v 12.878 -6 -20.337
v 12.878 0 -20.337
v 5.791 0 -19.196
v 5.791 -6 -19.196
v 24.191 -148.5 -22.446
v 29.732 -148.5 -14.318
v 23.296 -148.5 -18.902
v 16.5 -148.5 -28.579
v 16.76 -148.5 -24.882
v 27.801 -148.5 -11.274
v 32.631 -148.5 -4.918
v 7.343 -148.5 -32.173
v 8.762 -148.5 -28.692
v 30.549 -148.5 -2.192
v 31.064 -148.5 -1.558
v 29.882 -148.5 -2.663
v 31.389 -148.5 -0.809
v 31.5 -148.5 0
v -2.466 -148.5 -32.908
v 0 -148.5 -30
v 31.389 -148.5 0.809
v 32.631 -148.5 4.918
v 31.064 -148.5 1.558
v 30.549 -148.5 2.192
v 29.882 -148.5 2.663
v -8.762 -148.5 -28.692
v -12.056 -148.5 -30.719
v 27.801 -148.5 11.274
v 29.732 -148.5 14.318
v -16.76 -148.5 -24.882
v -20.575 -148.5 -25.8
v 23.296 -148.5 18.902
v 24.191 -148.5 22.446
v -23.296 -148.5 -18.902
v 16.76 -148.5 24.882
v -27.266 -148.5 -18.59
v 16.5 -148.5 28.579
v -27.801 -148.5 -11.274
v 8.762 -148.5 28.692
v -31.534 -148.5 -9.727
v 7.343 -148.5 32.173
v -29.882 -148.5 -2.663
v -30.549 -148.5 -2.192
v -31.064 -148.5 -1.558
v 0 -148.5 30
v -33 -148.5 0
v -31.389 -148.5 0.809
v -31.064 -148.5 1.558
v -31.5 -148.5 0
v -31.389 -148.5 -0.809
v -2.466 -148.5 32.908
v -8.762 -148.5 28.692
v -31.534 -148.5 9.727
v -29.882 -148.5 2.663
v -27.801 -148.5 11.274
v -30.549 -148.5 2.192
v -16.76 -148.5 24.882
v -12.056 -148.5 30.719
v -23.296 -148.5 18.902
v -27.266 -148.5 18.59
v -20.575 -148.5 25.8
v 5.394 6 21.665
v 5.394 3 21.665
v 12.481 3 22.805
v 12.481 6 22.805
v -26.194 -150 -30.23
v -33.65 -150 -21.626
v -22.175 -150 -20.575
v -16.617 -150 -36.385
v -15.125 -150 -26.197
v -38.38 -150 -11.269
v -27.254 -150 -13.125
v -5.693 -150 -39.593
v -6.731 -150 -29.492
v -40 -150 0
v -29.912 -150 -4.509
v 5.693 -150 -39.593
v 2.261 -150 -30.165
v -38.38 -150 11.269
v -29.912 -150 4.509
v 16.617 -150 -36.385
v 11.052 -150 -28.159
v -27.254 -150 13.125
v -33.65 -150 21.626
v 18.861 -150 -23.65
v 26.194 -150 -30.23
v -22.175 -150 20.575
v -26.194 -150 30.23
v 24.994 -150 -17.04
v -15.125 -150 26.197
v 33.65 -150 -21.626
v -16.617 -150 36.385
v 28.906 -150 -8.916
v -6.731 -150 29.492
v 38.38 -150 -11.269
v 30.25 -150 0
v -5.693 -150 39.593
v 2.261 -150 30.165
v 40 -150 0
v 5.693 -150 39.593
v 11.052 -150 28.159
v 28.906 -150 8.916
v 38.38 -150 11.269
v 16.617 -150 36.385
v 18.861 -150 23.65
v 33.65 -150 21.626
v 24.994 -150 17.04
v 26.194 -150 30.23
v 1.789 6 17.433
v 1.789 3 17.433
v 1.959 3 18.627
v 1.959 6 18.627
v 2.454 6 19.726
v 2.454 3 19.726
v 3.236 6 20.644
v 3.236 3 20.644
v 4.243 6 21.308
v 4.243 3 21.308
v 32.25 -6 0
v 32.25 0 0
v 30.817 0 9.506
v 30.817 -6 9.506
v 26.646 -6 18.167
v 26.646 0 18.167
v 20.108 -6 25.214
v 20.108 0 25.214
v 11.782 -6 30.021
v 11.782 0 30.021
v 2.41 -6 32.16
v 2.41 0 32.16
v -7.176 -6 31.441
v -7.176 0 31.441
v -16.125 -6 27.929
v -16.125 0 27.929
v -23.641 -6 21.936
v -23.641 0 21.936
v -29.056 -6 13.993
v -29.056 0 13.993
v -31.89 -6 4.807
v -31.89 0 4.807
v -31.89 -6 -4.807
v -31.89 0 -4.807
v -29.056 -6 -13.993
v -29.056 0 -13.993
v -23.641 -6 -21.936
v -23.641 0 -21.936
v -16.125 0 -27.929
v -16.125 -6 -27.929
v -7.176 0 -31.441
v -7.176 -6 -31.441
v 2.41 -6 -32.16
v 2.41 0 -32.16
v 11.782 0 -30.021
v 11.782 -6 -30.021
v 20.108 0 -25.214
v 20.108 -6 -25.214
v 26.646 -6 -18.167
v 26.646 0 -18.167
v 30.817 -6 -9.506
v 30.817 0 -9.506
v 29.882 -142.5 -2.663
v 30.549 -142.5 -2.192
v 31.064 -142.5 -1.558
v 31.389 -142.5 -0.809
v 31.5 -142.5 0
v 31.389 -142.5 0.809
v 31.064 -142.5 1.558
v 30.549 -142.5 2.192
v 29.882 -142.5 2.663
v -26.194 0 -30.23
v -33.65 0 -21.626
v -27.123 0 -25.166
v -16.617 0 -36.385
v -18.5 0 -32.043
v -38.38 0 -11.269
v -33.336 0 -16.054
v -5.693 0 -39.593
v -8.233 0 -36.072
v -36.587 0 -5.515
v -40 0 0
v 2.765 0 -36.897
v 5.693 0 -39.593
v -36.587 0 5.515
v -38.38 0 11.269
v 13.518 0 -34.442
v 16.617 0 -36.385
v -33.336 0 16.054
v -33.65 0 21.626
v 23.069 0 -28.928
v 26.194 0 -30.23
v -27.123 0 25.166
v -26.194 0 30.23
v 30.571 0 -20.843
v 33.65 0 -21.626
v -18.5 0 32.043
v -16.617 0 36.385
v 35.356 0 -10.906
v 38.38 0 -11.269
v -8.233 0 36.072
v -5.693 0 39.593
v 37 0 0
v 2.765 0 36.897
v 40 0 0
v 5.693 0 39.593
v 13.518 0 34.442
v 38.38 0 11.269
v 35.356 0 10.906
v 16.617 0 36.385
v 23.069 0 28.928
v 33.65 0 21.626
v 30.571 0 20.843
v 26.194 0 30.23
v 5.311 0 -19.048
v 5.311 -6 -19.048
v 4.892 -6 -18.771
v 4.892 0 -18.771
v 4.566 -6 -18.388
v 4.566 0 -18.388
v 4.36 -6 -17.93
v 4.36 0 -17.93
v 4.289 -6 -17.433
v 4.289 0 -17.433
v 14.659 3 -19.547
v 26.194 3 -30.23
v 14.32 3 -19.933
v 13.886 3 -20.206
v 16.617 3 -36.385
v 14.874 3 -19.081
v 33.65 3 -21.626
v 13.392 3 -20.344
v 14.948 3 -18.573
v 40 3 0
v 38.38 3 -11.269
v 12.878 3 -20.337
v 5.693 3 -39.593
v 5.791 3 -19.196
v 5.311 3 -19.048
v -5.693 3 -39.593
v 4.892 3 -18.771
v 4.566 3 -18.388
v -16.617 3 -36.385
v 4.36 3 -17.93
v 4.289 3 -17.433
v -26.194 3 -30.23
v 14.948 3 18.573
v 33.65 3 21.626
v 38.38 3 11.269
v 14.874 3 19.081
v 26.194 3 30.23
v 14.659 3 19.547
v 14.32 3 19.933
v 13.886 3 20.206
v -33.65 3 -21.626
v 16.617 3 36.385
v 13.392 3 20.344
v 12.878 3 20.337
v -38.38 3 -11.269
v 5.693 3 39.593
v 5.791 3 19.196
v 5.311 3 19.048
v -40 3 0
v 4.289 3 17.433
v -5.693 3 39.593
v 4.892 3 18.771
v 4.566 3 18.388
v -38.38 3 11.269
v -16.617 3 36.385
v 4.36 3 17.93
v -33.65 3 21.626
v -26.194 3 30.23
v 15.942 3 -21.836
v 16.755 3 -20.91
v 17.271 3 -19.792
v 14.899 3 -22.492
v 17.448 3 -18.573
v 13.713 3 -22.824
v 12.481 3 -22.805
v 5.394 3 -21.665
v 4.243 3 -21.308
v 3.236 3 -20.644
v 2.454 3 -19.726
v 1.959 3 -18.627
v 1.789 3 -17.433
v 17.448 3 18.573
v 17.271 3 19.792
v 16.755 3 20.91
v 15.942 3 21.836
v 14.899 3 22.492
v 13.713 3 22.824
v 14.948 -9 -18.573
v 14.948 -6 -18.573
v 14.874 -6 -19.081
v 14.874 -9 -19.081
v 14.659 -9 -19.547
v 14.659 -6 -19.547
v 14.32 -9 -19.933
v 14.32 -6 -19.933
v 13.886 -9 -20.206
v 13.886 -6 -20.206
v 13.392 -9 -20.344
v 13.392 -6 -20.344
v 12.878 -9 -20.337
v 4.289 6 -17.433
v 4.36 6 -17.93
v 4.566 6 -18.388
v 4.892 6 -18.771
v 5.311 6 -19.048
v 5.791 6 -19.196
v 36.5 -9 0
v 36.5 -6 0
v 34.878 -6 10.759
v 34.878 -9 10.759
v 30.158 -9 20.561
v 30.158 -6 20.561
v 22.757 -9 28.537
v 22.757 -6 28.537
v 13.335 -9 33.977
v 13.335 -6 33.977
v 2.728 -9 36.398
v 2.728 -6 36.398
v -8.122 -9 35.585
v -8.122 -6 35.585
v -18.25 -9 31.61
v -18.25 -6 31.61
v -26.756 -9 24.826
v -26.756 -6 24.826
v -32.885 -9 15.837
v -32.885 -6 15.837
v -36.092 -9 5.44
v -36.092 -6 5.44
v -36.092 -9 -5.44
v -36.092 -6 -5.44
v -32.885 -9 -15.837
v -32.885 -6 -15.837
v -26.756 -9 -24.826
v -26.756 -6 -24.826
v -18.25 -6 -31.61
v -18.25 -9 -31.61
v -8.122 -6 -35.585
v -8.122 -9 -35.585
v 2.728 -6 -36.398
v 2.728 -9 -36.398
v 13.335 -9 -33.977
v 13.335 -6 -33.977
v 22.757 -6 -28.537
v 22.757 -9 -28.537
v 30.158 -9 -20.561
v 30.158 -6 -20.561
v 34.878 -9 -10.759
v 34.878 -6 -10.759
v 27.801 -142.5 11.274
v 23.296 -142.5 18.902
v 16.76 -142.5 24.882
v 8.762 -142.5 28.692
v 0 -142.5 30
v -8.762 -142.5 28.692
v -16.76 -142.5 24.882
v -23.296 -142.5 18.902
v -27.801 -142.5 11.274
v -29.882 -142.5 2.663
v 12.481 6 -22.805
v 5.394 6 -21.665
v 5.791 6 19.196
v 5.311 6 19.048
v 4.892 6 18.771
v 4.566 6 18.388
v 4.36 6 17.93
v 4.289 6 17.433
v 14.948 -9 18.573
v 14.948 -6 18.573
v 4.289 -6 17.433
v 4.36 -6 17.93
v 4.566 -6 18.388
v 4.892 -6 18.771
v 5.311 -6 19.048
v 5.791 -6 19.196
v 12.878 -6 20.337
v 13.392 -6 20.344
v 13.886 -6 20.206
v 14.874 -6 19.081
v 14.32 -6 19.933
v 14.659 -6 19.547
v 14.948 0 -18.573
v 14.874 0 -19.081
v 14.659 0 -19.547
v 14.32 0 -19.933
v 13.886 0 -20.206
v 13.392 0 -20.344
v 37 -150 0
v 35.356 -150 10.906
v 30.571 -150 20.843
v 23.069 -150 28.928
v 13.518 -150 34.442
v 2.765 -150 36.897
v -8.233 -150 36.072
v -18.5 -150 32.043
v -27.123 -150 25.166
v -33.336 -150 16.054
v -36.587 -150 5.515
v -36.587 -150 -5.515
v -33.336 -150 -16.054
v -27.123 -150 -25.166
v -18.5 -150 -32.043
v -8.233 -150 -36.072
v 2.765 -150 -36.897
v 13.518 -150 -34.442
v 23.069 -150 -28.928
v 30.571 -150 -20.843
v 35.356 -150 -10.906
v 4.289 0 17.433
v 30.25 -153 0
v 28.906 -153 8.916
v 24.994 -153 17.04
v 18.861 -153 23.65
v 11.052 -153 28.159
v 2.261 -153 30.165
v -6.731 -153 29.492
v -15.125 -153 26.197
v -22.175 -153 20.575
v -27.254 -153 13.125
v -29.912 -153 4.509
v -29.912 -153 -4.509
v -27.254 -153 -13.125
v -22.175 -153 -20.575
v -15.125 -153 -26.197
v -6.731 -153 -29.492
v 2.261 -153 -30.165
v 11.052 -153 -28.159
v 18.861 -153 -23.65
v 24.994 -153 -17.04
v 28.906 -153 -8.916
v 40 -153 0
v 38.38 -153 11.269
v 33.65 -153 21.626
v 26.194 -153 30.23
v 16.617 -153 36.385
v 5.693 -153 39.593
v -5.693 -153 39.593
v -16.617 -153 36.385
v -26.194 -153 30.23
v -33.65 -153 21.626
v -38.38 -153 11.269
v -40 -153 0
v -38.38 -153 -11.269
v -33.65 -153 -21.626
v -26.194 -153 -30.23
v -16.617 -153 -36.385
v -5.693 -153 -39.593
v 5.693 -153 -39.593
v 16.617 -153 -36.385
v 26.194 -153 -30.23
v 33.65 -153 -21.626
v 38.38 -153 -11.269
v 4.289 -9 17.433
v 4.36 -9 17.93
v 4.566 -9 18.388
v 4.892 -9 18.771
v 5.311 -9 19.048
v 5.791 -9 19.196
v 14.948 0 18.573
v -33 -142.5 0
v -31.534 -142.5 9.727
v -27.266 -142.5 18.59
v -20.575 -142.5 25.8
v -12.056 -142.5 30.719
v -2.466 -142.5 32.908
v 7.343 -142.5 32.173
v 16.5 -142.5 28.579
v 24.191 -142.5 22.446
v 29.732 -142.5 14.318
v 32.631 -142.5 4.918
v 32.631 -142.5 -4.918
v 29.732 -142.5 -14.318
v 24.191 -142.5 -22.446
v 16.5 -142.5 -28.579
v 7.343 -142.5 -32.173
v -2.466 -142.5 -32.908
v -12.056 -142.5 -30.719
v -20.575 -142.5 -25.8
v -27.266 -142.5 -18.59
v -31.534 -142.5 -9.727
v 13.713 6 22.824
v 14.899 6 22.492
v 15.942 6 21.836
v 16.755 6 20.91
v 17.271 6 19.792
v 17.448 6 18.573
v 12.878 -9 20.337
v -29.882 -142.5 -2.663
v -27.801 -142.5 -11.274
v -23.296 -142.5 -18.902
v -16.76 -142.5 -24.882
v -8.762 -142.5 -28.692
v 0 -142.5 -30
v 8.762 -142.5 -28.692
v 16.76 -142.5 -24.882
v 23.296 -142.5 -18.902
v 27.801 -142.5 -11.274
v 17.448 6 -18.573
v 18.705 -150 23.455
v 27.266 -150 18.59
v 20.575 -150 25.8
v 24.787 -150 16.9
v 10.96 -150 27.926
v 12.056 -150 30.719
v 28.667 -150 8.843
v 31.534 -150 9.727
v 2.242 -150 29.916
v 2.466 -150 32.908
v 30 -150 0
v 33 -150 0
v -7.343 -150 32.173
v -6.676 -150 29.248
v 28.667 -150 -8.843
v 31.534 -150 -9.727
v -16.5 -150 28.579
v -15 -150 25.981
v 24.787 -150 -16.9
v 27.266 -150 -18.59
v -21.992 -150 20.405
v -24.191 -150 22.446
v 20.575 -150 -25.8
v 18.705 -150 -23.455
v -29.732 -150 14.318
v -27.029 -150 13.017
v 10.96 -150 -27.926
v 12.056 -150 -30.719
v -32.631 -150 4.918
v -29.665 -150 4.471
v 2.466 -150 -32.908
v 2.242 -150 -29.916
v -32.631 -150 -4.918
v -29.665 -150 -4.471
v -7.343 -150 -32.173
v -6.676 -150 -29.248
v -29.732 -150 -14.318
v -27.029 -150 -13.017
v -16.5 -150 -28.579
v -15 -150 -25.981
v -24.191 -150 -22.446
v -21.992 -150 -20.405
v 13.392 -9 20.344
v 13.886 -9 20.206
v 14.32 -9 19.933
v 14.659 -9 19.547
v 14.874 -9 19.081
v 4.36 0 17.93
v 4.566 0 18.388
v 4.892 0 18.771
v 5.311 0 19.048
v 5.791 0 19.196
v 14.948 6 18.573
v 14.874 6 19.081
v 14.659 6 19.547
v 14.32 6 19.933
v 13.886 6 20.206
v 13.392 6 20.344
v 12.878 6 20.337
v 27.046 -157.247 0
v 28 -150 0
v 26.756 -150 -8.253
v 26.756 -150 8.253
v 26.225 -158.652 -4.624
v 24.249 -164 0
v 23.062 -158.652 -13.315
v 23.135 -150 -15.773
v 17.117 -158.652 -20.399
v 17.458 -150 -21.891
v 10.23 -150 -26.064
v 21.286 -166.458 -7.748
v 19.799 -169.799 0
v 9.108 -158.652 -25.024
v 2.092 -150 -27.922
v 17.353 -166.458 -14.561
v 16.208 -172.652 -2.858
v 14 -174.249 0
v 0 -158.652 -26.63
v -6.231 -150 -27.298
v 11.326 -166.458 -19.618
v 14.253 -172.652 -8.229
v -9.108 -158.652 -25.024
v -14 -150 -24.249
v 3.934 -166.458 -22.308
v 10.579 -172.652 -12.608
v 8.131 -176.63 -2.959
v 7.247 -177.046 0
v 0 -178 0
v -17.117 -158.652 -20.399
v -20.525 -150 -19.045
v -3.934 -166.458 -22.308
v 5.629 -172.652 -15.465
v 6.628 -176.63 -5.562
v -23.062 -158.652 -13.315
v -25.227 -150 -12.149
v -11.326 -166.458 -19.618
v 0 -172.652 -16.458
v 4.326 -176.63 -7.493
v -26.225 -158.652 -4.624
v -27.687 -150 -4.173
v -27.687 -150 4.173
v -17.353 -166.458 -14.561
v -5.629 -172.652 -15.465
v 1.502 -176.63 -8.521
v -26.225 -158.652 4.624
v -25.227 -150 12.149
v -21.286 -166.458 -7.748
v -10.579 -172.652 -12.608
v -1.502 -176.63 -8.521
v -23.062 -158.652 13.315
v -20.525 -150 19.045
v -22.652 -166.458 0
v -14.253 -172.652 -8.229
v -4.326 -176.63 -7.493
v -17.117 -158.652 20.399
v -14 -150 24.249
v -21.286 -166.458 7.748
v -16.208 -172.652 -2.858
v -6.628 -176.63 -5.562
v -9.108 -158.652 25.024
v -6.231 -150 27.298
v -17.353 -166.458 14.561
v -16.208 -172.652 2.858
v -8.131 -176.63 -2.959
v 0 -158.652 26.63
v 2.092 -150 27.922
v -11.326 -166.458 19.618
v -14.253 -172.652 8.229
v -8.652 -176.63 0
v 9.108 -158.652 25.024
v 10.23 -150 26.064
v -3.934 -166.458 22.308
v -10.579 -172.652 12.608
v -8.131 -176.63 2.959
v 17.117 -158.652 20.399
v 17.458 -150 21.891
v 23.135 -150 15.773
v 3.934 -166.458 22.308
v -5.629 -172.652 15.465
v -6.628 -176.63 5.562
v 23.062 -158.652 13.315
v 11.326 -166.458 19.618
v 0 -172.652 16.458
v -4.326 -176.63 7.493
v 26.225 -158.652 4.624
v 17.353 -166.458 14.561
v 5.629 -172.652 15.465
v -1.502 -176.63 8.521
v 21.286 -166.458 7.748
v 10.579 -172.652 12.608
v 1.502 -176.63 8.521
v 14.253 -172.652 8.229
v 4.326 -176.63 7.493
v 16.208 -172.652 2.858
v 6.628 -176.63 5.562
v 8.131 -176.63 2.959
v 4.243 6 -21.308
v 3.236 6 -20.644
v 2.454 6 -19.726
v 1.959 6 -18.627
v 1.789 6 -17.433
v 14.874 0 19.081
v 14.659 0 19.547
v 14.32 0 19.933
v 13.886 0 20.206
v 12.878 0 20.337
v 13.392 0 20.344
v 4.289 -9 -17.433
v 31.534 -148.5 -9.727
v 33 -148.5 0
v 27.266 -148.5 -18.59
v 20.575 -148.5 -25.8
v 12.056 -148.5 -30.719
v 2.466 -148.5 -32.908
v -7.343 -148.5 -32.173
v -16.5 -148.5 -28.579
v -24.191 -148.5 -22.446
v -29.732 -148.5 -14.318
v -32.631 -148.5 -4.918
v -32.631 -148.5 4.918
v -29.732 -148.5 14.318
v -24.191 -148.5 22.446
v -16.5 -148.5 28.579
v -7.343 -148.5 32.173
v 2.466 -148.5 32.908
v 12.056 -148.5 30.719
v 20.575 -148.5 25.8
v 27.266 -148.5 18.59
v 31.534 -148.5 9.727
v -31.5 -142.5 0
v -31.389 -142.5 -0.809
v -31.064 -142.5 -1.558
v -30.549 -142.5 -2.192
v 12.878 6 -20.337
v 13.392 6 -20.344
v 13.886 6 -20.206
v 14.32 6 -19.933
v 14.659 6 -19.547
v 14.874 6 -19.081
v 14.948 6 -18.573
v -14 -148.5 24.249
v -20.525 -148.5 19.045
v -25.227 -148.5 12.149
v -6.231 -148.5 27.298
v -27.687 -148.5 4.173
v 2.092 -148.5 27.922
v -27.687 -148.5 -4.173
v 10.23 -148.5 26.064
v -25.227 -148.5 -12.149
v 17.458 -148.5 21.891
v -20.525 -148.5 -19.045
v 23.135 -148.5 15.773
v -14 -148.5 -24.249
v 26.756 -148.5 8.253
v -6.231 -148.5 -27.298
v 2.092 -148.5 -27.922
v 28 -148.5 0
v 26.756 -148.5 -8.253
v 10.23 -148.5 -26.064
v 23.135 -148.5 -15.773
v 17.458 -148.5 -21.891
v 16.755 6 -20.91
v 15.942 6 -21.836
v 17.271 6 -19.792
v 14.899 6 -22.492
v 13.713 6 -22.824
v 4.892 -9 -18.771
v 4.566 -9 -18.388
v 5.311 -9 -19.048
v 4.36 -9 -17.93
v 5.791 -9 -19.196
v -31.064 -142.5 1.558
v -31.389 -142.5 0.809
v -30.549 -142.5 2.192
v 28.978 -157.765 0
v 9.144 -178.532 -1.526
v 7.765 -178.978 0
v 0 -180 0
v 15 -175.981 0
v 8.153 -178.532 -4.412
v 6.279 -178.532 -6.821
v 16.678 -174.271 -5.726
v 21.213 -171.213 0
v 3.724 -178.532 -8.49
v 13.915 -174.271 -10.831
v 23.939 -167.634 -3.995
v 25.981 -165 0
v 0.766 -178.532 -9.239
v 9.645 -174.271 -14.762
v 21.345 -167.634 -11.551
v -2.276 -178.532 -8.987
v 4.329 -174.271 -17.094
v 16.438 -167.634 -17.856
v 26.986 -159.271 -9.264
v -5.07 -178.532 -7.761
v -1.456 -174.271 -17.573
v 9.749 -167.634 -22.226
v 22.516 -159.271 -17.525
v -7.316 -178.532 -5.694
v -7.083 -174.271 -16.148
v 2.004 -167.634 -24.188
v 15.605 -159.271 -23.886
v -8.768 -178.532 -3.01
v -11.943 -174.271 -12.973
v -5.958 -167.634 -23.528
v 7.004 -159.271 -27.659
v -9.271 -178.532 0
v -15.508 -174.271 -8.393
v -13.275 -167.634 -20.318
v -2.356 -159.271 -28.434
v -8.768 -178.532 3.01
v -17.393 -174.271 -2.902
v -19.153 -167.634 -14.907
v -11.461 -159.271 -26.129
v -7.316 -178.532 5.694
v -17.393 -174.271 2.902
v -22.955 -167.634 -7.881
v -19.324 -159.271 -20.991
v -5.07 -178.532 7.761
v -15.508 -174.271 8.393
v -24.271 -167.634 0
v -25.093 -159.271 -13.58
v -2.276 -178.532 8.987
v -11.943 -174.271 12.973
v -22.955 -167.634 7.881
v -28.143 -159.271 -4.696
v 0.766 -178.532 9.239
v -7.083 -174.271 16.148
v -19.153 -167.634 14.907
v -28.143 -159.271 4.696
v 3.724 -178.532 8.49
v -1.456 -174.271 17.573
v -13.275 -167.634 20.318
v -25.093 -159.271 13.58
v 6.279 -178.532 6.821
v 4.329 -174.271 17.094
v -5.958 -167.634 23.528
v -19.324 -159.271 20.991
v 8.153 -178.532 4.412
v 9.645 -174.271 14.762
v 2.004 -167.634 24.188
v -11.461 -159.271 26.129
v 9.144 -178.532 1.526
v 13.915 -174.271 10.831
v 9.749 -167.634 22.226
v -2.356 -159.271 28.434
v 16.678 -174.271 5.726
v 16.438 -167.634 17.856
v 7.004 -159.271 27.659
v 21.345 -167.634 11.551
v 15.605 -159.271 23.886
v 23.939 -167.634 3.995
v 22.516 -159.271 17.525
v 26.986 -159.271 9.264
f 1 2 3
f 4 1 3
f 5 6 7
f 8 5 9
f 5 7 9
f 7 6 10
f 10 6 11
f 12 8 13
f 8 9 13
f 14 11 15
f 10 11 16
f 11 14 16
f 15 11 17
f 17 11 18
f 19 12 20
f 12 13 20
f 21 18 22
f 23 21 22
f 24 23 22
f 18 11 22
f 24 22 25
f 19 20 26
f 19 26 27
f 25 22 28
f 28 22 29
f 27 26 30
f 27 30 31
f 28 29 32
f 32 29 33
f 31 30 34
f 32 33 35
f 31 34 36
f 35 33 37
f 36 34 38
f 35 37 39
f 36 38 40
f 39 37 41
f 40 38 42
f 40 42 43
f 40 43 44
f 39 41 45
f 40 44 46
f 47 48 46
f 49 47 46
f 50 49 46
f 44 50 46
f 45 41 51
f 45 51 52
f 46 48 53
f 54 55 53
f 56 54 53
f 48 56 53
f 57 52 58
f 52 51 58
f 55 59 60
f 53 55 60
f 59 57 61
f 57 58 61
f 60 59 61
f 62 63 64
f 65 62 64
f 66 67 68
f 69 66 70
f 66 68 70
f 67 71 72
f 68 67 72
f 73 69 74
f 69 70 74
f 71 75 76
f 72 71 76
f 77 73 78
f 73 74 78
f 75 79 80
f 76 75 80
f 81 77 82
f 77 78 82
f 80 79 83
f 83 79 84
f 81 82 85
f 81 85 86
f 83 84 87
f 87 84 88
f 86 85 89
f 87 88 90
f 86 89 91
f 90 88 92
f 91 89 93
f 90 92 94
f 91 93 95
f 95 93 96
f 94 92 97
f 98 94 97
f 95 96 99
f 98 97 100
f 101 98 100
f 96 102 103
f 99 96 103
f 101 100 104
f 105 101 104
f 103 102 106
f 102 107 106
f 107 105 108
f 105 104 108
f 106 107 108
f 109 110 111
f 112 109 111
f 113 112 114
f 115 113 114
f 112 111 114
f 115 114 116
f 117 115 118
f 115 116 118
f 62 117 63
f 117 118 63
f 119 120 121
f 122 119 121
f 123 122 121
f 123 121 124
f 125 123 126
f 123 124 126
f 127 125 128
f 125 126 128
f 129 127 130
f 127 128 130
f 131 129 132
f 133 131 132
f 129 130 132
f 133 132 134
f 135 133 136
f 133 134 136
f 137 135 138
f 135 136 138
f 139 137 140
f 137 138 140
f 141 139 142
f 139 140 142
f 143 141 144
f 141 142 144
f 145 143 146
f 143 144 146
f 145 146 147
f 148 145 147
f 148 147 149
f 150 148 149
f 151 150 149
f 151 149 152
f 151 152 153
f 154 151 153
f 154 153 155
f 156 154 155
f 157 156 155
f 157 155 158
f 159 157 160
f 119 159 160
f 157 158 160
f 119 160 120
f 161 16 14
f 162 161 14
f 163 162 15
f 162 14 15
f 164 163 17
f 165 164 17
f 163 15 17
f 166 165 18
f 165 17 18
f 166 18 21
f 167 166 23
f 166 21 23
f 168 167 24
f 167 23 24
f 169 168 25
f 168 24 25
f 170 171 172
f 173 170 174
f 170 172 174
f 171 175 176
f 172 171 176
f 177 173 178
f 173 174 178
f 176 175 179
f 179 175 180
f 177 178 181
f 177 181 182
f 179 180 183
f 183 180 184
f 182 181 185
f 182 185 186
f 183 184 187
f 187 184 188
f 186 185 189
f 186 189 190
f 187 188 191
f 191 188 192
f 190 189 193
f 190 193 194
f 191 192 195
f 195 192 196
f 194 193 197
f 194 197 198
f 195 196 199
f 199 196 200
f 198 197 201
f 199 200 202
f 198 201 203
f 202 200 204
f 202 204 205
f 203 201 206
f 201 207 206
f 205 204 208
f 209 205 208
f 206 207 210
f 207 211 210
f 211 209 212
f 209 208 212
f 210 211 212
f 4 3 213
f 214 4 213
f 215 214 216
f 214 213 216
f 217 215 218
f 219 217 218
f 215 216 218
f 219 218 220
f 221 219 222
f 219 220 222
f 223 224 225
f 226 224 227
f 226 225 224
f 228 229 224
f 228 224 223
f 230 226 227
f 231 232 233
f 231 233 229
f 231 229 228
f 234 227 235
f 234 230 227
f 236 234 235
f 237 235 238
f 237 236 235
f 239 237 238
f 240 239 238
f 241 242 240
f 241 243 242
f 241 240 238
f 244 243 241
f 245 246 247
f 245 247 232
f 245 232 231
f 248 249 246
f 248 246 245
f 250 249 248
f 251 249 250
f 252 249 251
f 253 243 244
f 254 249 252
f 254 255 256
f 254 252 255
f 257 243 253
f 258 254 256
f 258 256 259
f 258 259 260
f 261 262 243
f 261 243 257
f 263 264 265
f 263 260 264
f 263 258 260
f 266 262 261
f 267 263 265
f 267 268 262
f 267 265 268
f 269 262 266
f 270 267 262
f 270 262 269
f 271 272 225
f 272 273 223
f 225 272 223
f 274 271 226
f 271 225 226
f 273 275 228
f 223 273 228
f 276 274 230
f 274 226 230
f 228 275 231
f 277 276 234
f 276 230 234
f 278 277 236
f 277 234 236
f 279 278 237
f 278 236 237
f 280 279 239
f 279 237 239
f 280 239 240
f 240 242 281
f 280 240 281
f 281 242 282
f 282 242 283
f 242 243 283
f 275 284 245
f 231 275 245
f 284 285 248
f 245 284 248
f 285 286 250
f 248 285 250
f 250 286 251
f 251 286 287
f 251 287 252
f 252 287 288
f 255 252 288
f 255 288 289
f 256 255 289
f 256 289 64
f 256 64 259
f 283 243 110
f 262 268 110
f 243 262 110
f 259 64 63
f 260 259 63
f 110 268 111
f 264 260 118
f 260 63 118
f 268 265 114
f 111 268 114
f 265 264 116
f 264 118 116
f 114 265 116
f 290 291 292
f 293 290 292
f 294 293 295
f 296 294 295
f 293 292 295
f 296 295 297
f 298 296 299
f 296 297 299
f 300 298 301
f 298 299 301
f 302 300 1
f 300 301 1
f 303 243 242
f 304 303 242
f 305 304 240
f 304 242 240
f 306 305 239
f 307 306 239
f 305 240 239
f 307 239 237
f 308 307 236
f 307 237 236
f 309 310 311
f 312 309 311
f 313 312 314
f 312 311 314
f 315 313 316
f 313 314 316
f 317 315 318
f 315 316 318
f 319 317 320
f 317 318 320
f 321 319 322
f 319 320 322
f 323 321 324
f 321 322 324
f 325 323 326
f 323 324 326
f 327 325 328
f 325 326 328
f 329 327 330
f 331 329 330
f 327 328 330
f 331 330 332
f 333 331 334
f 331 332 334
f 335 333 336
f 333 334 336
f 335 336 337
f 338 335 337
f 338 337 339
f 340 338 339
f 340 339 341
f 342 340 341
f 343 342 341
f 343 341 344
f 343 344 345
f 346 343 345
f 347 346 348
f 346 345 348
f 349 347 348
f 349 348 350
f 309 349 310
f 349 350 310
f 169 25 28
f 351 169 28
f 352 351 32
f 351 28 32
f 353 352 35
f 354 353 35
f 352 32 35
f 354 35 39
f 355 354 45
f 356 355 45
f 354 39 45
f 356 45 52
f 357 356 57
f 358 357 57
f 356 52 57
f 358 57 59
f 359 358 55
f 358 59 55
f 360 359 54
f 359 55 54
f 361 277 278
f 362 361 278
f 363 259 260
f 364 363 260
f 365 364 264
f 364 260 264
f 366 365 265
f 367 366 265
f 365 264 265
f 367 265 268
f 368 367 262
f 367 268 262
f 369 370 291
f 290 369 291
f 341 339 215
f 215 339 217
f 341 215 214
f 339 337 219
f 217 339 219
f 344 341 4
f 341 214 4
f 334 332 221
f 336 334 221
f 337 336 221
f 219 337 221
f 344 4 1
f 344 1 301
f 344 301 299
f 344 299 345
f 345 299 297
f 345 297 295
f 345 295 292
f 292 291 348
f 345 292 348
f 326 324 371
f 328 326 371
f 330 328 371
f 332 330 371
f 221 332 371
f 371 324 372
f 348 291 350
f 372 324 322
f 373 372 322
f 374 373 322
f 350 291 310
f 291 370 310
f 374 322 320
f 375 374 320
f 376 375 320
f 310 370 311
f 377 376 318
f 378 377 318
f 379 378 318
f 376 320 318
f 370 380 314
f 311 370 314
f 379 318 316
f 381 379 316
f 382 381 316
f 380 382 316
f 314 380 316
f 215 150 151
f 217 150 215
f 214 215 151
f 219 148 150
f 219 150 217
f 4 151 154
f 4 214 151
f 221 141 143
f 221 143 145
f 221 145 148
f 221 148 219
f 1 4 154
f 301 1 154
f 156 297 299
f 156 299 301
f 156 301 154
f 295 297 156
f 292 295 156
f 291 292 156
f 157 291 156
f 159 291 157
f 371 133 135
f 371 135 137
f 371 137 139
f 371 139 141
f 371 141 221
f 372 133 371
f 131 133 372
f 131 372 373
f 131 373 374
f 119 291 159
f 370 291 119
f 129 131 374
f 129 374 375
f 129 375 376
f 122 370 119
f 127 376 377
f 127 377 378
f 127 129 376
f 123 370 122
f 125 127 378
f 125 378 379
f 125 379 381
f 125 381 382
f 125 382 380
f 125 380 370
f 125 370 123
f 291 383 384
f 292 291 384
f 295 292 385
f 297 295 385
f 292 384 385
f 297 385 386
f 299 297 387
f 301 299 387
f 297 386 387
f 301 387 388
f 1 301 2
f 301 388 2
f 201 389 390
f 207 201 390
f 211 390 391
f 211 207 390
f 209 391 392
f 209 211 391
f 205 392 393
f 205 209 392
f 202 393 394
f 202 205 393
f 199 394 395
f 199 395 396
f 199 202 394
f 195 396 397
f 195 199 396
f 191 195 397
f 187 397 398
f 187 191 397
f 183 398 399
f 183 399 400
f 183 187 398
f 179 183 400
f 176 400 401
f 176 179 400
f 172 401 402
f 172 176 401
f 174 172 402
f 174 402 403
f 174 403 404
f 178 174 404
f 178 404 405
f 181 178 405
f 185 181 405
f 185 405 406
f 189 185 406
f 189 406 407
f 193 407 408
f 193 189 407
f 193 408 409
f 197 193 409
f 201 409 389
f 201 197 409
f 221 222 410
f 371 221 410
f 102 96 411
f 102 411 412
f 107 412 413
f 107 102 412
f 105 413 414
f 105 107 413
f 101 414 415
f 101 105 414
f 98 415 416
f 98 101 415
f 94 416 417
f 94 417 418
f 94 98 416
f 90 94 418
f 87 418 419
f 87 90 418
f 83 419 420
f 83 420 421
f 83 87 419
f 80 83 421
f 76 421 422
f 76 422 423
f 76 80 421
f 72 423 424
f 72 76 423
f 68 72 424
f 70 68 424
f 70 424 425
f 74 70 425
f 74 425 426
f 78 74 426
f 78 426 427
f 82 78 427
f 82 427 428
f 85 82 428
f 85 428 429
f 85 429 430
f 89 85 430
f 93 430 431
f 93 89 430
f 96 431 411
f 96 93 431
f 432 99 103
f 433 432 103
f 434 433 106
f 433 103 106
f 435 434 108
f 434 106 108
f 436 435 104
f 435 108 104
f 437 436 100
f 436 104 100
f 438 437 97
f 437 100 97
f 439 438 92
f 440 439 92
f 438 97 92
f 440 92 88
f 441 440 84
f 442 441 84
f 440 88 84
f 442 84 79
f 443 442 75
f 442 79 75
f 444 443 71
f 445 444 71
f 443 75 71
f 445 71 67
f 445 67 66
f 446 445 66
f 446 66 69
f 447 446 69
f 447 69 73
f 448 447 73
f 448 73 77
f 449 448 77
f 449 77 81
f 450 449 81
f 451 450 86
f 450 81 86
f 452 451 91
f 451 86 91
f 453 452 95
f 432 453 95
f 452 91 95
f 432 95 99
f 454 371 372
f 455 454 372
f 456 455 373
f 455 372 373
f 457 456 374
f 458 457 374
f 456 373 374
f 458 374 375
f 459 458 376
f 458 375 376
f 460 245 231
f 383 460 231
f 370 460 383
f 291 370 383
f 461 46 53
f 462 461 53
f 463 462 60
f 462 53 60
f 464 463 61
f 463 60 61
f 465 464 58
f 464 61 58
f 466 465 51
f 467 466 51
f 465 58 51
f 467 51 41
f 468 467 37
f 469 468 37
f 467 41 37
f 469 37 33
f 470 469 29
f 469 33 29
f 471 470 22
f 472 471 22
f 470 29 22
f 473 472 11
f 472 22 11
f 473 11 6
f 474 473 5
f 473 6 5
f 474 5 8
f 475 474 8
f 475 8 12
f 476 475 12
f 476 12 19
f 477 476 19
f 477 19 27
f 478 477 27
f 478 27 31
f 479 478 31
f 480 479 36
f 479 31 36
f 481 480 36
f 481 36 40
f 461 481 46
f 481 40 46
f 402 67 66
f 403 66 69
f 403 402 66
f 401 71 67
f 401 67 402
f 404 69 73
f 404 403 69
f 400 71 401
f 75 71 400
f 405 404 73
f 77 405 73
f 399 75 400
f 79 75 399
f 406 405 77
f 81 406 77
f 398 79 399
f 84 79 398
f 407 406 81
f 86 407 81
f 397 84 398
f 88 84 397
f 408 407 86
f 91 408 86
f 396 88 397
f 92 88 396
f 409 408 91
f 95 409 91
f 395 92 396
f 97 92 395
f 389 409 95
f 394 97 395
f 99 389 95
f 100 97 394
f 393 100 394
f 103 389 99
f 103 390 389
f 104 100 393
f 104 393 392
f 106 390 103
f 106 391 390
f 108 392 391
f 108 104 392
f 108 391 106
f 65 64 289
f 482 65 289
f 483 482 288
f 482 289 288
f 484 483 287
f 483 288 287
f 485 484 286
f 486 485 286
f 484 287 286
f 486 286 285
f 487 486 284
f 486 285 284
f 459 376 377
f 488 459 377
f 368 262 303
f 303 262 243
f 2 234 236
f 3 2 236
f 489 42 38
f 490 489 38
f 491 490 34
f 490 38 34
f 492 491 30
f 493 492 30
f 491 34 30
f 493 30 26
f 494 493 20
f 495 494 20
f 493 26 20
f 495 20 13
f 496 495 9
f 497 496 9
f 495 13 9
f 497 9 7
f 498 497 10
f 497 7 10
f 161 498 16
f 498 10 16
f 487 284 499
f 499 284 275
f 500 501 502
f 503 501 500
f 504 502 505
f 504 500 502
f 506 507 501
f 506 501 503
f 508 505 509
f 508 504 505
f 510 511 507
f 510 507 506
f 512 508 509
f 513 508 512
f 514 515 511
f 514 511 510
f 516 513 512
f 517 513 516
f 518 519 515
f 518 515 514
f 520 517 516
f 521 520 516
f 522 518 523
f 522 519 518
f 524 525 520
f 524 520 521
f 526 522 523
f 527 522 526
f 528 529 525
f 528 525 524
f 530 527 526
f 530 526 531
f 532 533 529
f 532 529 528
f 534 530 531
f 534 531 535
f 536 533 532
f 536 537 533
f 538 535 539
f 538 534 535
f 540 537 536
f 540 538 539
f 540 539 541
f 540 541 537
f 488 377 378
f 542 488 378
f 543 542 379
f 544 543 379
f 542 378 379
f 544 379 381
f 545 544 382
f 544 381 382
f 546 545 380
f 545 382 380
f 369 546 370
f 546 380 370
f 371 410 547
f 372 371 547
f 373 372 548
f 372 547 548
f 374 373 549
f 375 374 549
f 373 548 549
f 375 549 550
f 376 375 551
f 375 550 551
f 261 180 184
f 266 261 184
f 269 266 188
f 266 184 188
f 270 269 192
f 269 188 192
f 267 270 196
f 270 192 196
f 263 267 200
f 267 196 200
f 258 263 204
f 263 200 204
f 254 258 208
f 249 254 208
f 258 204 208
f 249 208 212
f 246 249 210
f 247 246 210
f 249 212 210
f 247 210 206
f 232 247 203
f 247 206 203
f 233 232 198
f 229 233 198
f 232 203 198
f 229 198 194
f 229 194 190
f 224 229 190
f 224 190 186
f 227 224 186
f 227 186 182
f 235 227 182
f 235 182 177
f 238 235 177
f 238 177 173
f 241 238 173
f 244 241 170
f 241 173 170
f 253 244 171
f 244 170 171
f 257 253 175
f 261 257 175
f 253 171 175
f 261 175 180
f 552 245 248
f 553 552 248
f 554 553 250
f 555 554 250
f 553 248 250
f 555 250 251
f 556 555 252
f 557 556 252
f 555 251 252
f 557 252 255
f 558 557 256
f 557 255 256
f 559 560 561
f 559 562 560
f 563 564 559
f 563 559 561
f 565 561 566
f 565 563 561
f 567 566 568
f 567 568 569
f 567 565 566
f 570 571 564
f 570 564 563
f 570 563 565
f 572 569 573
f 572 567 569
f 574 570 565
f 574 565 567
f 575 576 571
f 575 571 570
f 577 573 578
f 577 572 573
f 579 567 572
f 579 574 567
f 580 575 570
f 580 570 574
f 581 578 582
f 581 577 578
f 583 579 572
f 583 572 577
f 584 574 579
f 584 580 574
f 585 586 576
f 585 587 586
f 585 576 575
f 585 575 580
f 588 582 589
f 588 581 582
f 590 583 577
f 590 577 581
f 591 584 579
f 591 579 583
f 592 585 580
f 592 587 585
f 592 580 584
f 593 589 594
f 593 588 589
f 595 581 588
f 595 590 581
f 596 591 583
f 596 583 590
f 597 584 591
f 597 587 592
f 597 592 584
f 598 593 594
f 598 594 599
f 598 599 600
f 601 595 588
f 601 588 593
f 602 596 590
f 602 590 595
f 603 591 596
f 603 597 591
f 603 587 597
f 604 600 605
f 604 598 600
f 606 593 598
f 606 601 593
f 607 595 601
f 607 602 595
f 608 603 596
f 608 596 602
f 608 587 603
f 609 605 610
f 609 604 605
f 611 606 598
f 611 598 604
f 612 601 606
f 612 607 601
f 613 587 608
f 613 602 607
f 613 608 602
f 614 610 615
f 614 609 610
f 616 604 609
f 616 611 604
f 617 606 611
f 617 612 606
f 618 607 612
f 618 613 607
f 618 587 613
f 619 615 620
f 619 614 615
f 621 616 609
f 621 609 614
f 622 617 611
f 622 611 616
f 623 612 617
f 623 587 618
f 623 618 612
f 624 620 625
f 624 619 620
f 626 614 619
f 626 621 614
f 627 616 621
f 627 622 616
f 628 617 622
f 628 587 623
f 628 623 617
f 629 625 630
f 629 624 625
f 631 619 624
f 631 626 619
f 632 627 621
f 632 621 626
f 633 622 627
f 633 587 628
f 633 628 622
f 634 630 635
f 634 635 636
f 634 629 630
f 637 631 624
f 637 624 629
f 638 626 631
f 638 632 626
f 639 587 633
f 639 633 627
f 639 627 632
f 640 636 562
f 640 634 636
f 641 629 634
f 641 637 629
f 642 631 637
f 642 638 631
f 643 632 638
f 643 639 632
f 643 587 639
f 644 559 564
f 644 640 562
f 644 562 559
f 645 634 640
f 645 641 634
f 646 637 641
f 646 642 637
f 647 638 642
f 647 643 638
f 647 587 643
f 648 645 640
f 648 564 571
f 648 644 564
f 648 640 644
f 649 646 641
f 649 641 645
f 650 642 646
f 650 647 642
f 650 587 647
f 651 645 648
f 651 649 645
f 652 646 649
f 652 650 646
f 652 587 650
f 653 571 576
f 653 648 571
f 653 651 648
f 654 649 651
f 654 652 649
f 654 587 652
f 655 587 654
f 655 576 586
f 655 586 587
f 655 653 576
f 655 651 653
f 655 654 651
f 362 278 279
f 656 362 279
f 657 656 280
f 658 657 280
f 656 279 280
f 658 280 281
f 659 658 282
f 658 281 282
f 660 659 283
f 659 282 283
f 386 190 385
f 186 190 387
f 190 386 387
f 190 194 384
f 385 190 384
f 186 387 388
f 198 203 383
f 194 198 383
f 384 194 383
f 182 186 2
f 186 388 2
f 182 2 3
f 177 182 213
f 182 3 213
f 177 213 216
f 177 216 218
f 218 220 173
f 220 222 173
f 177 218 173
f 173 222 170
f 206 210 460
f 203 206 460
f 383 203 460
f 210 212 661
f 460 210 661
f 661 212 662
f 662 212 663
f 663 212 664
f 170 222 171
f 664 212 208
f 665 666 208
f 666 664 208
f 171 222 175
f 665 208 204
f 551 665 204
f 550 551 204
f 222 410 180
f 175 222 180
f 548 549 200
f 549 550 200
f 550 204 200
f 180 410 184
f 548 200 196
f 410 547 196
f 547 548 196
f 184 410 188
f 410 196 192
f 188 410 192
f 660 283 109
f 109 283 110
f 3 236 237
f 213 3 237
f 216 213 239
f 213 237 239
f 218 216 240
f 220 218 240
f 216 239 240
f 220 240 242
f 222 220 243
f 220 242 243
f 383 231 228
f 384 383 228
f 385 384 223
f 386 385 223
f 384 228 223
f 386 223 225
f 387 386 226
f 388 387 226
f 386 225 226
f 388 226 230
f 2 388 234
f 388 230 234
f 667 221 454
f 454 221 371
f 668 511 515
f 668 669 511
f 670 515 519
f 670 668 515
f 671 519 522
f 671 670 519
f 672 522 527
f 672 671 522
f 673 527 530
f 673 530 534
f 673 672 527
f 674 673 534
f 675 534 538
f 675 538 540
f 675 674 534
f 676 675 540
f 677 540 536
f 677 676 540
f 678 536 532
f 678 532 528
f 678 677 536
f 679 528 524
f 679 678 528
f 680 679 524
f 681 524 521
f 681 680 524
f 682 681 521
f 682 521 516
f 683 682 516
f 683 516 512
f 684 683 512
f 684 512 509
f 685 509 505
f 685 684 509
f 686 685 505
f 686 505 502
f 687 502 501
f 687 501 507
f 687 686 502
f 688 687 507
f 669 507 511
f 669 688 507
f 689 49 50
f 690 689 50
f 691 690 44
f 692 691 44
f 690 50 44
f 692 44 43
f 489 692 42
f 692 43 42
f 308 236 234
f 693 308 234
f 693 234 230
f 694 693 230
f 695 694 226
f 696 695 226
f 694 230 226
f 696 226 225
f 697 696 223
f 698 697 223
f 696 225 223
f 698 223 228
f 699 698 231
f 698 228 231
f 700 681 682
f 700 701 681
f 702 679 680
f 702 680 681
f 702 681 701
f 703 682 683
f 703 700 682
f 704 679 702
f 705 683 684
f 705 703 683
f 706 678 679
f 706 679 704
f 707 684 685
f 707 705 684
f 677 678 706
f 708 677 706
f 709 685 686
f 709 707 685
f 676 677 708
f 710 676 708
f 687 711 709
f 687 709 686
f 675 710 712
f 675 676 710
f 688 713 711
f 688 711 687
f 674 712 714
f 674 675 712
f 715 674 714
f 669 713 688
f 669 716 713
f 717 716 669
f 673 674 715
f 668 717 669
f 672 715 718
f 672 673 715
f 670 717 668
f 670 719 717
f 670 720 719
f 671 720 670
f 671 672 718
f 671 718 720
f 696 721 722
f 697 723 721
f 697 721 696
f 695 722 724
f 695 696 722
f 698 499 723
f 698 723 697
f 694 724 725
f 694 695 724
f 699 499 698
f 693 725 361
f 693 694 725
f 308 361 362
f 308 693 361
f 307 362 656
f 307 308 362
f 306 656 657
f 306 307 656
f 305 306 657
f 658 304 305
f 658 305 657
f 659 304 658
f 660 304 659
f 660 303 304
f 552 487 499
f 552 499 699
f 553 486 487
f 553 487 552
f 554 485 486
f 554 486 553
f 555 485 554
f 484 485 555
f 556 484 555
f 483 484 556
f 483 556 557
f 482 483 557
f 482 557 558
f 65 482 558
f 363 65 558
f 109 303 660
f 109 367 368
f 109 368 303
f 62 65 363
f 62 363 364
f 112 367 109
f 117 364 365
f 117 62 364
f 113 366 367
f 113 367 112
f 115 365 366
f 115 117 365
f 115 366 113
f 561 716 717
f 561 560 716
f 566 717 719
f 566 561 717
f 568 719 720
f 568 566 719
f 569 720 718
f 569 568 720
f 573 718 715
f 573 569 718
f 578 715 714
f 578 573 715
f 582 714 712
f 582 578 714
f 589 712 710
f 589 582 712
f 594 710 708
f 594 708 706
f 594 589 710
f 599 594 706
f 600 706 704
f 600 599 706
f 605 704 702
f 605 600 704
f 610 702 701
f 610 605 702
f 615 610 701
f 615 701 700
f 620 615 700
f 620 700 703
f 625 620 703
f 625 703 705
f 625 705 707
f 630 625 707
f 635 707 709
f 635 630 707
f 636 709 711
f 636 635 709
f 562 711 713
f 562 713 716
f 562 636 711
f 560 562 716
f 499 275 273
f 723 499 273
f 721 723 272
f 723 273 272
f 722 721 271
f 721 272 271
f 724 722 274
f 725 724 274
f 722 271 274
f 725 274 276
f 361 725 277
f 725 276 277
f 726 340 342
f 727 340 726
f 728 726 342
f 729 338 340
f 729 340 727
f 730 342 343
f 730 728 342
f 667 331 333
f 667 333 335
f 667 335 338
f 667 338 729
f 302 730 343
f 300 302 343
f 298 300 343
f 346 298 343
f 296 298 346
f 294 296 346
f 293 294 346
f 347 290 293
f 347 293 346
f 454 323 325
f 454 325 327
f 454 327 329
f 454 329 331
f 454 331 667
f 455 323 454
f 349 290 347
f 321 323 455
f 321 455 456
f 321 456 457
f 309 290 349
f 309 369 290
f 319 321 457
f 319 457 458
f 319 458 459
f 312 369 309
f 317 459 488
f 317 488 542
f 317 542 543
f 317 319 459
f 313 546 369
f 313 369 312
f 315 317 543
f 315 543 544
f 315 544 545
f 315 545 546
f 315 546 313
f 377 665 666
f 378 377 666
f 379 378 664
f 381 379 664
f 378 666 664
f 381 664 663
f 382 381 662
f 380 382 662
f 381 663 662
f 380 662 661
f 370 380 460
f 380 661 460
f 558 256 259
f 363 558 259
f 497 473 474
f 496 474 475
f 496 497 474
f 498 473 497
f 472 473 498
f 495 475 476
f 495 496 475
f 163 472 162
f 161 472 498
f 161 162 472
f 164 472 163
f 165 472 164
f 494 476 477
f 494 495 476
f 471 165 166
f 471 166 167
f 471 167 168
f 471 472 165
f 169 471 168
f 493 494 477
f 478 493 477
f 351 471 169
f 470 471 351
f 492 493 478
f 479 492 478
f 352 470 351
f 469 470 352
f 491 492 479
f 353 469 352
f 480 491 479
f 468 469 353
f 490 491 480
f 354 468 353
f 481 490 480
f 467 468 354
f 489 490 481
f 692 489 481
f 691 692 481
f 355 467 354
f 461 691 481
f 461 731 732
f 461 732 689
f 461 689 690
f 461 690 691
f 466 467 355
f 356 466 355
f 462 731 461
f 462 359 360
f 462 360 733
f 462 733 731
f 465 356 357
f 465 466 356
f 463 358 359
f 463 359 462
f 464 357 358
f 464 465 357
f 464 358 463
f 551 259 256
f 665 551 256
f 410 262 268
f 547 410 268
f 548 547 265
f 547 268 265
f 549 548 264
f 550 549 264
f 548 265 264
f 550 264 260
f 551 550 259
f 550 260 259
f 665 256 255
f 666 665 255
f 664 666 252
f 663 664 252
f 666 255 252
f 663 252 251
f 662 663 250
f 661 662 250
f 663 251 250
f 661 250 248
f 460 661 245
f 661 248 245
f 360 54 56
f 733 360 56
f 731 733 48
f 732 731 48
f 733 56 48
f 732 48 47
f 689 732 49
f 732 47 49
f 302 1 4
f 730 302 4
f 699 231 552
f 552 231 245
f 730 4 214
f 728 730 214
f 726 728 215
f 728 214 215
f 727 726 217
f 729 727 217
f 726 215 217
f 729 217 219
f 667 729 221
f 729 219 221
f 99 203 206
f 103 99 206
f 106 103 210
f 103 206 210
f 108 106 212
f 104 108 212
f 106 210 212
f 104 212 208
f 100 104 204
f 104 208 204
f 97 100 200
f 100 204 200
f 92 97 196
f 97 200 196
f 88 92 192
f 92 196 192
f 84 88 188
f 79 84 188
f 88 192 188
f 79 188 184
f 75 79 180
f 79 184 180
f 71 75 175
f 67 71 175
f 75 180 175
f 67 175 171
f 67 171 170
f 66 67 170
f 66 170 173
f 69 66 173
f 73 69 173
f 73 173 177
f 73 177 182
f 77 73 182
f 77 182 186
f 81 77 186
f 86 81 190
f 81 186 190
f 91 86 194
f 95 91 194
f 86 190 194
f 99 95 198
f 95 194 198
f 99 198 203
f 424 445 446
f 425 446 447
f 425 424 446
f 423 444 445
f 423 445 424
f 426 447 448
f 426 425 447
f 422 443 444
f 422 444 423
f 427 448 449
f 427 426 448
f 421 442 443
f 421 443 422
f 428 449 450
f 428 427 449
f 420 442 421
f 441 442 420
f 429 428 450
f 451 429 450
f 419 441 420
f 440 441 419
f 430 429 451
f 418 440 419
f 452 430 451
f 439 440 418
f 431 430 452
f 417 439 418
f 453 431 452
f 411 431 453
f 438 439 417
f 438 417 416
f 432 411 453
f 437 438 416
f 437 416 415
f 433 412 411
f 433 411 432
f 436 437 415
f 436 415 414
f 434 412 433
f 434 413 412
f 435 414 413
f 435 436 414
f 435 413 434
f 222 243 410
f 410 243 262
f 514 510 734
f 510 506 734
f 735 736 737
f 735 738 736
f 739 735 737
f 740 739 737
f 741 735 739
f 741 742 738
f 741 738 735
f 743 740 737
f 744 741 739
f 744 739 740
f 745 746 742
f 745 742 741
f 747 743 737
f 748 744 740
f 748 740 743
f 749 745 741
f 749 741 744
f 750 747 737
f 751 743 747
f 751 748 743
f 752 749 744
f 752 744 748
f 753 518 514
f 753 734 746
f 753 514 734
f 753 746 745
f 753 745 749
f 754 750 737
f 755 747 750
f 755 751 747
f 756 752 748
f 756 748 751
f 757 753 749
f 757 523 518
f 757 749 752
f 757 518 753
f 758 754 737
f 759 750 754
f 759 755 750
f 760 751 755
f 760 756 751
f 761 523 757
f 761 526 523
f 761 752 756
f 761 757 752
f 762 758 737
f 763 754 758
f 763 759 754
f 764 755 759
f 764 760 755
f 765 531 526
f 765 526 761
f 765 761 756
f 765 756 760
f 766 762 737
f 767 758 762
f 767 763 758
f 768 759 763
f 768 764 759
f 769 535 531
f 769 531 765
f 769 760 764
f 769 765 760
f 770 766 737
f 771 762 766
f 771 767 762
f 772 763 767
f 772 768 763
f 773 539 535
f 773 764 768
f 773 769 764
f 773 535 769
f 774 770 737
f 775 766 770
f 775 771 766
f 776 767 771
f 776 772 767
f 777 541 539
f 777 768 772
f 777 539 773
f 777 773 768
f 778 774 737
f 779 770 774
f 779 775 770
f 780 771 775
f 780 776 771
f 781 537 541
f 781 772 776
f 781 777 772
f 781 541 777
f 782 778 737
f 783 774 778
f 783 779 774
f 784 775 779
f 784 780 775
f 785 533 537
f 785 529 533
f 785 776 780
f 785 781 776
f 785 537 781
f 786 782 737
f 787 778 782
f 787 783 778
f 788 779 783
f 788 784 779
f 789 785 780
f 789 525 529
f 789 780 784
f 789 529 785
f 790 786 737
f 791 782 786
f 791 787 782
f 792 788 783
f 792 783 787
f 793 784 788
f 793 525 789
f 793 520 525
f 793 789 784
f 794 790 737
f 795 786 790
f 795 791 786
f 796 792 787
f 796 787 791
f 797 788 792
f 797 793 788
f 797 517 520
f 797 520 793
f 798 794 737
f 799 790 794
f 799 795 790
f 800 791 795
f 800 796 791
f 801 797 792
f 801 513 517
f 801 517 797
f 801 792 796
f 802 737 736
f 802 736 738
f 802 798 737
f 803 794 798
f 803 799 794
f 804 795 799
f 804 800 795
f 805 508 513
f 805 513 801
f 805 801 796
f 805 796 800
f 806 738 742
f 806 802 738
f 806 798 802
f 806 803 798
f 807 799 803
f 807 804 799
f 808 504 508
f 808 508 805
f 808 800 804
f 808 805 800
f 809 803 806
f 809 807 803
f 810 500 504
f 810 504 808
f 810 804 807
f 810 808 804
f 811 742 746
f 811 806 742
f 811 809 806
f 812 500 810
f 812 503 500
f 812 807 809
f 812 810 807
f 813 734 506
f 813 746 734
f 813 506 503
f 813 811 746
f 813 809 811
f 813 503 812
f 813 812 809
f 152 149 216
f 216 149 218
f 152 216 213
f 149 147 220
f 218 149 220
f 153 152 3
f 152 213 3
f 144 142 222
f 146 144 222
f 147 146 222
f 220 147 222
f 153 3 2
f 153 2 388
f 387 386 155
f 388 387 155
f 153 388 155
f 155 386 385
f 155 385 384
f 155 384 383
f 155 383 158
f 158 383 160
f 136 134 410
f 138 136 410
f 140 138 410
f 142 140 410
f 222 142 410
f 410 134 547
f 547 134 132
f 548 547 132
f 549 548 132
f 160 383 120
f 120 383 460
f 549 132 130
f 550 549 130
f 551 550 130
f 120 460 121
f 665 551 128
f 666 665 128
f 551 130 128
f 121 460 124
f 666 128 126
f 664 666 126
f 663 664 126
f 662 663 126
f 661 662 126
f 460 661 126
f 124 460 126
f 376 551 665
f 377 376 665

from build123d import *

# Parameters (mm, degrees)
F0_R      = 40
F0_R_2    = 37
F1_DEPTH  = 150
F4_R      = 40
F4_R_2    = 30.25
F5_DEPTH  = 3
F6_R      = 33
F7_DEPTH  = 6
F8_R      = 40
F9_DEPTH  = 3
F10_R     = 32.25
F11_DEPTH = 6
F12_R     = 36.5
F13_DEPTH = 3
F15_DEPTH = 183.001
F17_DEPTH = 3


with BuildPart() as f1:
    # F0 (on Front) → F1 (new body)
    with BuildSketch(Plane.XZ):
        Circle(F0_R)
        Circle(F0_R_2, mode=Mode.SUBTRACT)
    extrude(amount=F1_DEPTH)


with BuildPart() as f3:
    # F2 (on Top) → F3 (revolve)
    with BuildSketch(Plane.XY):
        with BuildLine():
            ThreePointArc((0, -180), (21.2132034356, -171.2132034356), (30, -150))
            Line((30, -150), (33, -150))
            Line((33, -150), (33, -148.5))
            Line((33, -148.5), (28, -148.5))
            Line((28, -148.5), (28, -150))
            ThreePointArc((28, -150), (19.7989898732, -169.7989898732), (0, -178))
            Line((0, -178), (0, -180))
        make_face()
    revolve(axis=Axis((0, -179, 0), (0, 1, 0)))


with BuildPart() as f5:
    # F4 (on face) → F5 (new body)
    with BuildSketch(Plane.XZ.offset(150)):
        Circle(F4_R)
        Circle(F4_R_2, mode=Mode.SUBTRACT)
    extrude(amount=F5_DEPTH)


with BuildPart() as f7:
    # F6 (on face) → F7 (new body)
    with BuildSketch(Plane(origin=(0, -148.5, 0), x_dir=(-1, 0, 0), z_dir=(0, 1, 0))):
        Circle(F6_R)
        with BuildLine():
            ThreePointArc((-29.8815789474, 2.662938154), (0, 30), (29.8815789474, 2.662938154))
            ThreePointArc((29.8815789474, 2.662938154), (31.0636630865, 1.5580858702), (31.5, 0))
            ThreePointArc((31.5, 0), (31.0636630865, -1.5580858702), (29.8815789474, -2.662938154))
            ThreePointArc((29.8815789474, -2.662938154), (0, -30), (-29.8815789474, -2.662938154))
            ThreePointArc((-29.8815789474, -2.662938154), (-31.5, 0), (-29.8815789474, 2.662938154))
        make_face(mode=Mode.SUBTRACT)
    extrude(amount=F7_DEPTH)


with BuildPart() as f9:
    # F8 (on face) → F9 (new body)
    with BuildSketch(Plane(origin=(0, 0, 0), x_dir=(-1, 0, 0), z_dir=(0, 1, 0))):
        Circle(F8_R)
    extrude(amount=F9_DEPTH)


with BuildPart() as f11:
    # F10 (on face) → F11 (new body)
    with BuildSketch(Plane.XZ):
        Circle(F10_R)
    extrude(amount=F11_DEPTH)


with BuildPart() as f13:
    # F12 (on face) → F13 (new body)
    with BuildSketch(Plane.XZ.offset(6)):
        Circle(F12_R)
    extrude(amount=F13_DEPTH)


with BuildPart() as f15_tool:
    # F14 (on face) → F15 (new body, through all)
    with BuildSketch(Plane(origin=(0, 3, 0), x_dir=(-1, 0, 0), z_dir=(0, 1, 0))):
        with BuildLine():
            Line((-5.7912985909, 19.1963108418), (-12.8782985909, 20.3365394891))
            ThreePointArc((-12.8782985909, 20.3365394891), (-14.3202541352, 19.9327172046), (-14.948, 18.5732160614))
            Line((-14.948, 18.5732160614), (-14.948, -18.5732160614))
            ThreePointArc((-14.948, -18.5732160614), (-14.3202541352, -19.9327172046), (-12.8782985909, -20.3365394891))
            Line((-12.8782985909, -20.3365394891), (-5.7912985909, -19.1963108418))
            ThreePointArc((-5.7912985909, -19.1963108418), (-4.7154988568, -18.5912415494), (-4.289, -17.4329874142))
            Line((-4.289, -17.4329874142), (-4.289, 17.4329874142))
            ThreePointArc((-4.289, 17.4329874142), (-4.7154988568, 18.5912415494), (-5.7912985909, 19.1963108418))
        make_face()
    extrude(amount=-F15_DEPTH)


with BuildPart() as f9_1:
    add(f9.part)

    # F15: cut by f15_tool
    add(f15_tool.part, mode=Mode.SUBTRACT)


with BuildPart() as f11_1:
    add(f11.part)

    # F15: cut by f15_tool
    add(f15_tool.part, mode=Mode.SUBTRACT)


with BuildPart() as f13_1:
    add(f13.part)

    # F15: cut by f15_tool
    add(f15_tool.part, mode=Mode.SUBTRACT)


with BuildPart() as f17:
    # F16 (on face) → F17 (new body)
    with BuildSketch(Plane(origin=(0, 3, 0), x_dir=(-1, 0, 0), z_dir=(0, 1, 0))):
        with BuildLine():
            Line((-5.394180157, 21.6645687193), (-12.481180157, 22.8047973665))
            ThreePointArc((-12.481180157, 22.8047973665), (-15.941550517, 21.8357143256), (-17.448, 18.5732160614))
            Line((-17.448, 18.5732160614), (-17.448, -18.5732160614))
            ThreePointArc((-17.448, -18.5732160614), (-15.941550517, -21.8357143256), (-12.481180157, -22.8047973665))
            Line((-12.481180157, -22.8047973665), (-5.394180157, -21.6645687193))
            ThreePointArc((-5.394180157, -21.6645687193), (-2.8125017359, -20.2125379312), (-1.789, -17.4329874142))
            Line((-1.789, -17.4329874142), (-1.789, 17.4329874142))
            ThreePointArc((-1.789, 17.4329874142), (-2.8125017359, 20.2125379312), (-5.394180157, 21.6645687193))
        make_face()
        with BuildLine():
            Line((-14.948, -18.5732160614), (-14.948, 18.5732160614))
            ThreePointArc((-14.948, 18.5732160614), (-14.3202541352, 19.9327172046), (-12.8782985909, 20.3365394891))
            Line((-12.8782985909, 20.3365394891), (-5.7912985909, 19.1963108418))
            ThreePointArc((-5.7912985909, 19.1963108418), (-4.7154988568, 18.5912415494), (-4.289, 17.4329874142))
            Line((-4.289, 17.4329874142), (-4.289, -17.4329874142))
            ThreePointArc((-4.289, -17.4329874142), (-4.7154988568, -18.5912415494), (-5.7912985909, -19.1963108418))
            Line((-5.7912985909, -19.1963108418), (-12.8782985909, -20.3365394891))
            ThreePointArc((-12.8782985909, -20.3365394891), (-14.3202541352, -19.9327172046), (-14.948, -18.5732160614))
        make_face(mode=Mode.SUBTRACT)
    extrude(amount=F17_DEPTH)


solid = Compound([f1.part, f3.part, f5.part, f7.part, f9_1.part, f11_1.part, f13_1.part, f17.part])
